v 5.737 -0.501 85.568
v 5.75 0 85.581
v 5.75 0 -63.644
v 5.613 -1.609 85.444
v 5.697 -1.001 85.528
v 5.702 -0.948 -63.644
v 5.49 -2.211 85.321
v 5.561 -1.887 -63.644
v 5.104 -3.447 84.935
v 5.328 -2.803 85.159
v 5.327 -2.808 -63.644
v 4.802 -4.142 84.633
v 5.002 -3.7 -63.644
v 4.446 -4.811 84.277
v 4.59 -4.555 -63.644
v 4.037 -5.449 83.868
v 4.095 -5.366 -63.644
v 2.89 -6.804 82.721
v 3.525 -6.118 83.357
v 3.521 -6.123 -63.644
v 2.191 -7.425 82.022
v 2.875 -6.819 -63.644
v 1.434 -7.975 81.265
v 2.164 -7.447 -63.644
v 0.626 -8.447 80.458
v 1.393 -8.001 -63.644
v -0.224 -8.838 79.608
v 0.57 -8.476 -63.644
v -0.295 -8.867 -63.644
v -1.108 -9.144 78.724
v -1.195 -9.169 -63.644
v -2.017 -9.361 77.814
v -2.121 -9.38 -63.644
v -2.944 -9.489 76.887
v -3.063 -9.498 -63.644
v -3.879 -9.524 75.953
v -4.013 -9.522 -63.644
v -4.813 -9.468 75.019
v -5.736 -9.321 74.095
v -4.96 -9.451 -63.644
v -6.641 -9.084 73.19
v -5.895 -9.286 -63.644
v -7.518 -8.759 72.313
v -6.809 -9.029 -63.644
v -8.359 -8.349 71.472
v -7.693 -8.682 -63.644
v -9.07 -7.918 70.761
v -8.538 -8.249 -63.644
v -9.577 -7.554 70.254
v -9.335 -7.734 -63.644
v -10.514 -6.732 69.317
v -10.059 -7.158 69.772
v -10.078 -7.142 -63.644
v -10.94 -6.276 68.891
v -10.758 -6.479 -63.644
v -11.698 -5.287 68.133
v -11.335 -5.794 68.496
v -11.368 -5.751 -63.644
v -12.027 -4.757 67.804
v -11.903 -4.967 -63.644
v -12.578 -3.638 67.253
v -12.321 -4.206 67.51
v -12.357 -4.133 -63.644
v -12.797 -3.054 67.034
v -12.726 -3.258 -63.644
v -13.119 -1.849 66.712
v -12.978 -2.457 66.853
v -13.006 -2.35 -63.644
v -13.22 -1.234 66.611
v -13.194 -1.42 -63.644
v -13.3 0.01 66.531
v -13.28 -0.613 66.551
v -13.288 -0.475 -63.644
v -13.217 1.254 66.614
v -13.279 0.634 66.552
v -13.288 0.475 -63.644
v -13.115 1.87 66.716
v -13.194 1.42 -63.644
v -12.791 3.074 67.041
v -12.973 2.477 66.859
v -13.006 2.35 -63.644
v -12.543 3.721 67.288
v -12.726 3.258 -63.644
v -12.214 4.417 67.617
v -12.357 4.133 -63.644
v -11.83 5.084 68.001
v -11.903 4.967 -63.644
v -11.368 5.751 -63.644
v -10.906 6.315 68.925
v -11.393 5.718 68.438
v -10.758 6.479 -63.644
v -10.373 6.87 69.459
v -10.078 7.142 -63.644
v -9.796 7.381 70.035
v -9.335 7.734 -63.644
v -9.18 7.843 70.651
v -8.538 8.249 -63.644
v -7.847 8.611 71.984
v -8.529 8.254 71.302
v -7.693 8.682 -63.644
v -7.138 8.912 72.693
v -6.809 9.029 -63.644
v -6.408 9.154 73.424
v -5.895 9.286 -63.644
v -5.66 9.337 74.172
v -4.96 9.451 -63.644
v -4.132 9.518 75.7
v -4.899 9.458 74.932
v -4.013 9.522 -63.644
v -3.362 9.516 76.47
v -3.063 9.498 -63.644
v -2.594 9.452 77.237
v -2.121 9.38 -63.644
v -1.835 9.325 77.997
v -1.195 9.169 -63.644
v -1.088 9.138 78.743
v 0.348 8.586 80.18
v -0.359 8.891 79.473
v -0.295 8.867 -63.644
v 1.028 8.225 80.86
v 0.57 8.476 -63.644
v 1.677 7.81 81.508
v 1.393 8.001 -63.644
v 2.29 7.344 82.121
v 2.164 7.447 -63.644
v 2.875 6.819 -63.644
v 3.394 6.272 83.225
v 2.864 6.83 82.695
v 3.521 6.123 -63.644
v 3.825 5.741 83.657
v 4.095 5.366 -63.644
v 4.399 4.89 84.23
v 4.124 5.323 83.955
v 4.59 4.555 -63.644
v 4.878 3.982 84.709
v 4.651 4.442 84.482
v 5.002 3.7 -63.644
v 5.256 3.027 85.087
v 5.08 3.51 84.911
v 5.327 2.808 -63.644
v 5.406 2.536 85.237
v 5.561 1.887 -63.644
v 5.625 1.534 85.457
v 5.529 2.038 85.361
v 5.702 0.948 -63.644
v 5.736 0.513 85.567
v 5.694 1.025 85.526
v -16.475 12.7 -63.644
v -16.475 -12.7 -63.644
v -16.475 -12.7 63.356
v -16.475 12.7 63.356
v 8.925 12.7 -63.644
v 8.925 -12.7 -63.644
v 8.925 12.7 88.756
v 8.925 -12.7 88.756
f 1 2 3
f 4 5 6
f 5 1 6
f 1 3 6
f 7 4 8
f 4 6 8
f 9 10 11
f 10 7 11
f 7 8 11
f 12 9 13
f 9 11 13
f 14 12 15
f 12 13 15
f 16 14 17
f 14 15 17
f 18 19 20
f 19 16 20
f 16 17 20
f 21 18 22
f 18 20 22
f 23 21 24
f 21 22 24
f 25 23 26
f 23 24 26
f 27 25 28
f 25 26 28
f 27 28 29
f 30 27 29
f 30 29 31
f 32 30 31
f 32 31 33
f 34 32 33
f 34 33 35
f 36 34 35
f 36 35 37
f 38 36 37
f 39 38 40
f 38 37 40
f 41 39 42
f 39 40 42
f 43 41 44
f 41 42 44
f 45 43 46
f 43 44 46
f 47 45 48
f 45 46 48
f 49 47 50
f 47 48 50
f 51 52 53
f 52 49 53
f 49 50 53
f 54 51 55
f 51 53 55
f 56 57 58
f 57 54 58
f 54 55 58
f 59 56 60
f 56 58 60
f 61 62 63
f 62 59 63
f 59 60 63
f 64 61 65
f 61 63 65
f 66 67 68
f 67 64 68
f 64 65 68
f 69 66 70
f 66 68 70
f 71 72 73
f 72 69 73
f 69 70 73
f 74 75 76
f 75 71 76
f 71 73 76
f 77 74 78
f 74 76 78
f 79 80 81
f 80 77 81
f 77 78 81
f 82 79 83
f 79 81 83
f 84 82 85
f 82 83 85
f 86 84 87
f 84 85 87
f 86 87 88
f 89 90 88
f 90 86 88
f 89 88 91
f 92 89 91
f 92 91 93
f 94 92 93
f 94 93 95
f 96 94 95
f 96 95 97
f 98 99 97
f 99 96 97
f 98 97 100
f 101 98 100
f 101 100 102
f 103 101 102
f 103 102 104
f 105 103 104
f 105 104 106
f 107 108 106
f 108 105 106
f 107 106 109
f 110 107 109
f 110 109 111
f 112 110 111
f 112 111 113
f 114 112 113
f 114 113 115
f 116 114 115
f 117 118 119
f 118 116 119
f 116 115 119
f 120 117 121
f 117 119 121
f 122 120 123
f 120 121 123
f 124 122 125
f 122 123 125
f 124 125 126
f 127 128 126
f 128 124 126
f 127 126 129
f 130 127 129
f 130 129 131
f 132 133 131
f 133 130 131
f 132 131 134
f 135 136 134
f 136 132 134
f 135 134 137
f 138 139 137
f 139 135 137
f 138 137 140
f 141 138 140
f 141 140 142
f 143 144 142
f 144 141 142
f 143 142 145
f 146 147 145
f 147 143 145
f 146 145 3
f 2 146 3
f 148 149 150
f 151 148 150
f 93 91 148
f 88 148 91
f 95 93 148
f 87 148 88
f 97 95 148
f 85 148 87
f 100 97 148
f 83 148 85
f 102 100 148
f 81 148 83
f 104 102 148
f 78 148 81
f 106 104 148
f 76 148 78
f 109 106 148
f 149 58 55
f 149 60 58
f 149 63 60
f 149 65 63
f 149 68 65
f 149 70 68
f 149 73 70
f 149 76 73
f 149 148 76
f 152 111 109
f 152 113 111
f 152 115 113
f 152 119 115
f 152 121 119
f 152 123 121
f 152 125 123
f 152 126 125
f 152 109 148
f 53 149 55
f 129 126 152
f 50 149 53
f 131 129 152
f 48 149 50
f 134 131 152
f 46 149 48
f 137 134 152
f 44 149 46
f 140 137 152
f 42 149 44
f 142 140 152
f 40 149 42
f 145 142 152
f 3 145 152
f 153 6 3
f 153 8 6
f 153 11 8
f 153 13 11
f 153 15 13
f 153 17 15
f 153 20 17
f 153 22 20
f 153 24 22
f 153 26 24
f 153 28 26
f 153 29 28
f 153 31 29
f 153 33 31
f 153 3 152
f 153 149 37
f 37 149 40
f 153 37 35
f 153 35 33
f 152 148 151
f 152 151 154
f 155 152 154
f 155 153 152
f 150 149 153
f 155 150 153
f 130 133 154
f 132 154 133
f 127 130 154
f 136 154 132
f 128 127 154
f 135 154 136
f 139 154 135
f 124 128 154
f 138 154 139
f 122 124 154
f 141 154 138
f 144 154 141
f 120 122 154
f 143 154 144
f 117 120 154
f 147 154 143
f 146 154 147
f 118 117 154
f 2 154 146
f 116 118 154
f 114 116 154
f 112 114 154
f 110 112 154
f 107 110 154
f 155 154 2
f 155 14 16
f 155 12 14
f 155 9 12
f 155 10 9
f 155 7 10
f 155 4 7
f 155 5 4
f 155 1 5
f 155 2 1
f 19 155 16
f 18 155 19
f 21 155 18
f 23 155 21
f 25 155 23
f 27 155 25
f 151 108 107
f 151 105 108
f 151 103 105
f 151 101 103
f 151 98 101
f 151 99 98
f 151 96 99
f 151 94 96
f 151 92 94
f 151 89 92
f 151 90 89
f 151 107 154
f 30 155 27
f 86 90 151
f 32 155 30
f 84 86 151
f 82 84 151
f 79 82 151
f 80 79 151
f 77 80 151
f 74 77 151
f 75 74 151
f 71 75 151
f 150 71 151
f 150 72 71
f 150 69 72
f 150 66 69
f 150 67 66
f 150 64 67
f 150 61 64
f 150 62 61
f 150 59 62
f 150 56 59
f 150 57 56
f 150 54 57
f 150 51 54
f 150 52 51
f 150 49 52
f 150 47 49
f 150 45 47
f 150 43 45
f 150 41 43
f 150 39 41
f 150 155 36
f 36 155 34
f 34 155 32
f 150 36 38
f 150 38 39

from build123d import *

# Parameters (mm, degrees)
F0_W     = 25.4
F0_H     = 127
F1_DEPTH = 12.7
F4_DEPTH = 12.7
F2_R     = 9.525
F5_DEPTH = 152.401


with BuildPart() as f1:
    # F0 (on Front) → F1 (new body, symmetric)
    with BuildSketch(Plane.XZ):
        with Locations((-3.775233, -0.143904)):
            Rectangle(F0_W, F0_H)
    extrude(amount=F1_DEPTH, both=True)

    # F3 (on Front) → F4 (join, symmetric)
    with BuildSketch(Plane.XZ):
        Polygon((-16.475233, 63.356096), (8.924767, 63.356096), (8.924767, 88.756096), align=None)
    extrude(amount=F4_DEPTH, both=True)

    # F2 (on face) → F5 (cut, through all)
    with BuildSketch(Plane(origin=(0, 0, -63.643904), x_dir=(1, 0, 0), z_dir=(0, 0, -1))):
        with Locations((-3.775233, 0)):
            Circle(F2_R)
    extrude(amount=-F5_DEPTH, mode=Mode.SUBTRACT)


solid = f1.part
